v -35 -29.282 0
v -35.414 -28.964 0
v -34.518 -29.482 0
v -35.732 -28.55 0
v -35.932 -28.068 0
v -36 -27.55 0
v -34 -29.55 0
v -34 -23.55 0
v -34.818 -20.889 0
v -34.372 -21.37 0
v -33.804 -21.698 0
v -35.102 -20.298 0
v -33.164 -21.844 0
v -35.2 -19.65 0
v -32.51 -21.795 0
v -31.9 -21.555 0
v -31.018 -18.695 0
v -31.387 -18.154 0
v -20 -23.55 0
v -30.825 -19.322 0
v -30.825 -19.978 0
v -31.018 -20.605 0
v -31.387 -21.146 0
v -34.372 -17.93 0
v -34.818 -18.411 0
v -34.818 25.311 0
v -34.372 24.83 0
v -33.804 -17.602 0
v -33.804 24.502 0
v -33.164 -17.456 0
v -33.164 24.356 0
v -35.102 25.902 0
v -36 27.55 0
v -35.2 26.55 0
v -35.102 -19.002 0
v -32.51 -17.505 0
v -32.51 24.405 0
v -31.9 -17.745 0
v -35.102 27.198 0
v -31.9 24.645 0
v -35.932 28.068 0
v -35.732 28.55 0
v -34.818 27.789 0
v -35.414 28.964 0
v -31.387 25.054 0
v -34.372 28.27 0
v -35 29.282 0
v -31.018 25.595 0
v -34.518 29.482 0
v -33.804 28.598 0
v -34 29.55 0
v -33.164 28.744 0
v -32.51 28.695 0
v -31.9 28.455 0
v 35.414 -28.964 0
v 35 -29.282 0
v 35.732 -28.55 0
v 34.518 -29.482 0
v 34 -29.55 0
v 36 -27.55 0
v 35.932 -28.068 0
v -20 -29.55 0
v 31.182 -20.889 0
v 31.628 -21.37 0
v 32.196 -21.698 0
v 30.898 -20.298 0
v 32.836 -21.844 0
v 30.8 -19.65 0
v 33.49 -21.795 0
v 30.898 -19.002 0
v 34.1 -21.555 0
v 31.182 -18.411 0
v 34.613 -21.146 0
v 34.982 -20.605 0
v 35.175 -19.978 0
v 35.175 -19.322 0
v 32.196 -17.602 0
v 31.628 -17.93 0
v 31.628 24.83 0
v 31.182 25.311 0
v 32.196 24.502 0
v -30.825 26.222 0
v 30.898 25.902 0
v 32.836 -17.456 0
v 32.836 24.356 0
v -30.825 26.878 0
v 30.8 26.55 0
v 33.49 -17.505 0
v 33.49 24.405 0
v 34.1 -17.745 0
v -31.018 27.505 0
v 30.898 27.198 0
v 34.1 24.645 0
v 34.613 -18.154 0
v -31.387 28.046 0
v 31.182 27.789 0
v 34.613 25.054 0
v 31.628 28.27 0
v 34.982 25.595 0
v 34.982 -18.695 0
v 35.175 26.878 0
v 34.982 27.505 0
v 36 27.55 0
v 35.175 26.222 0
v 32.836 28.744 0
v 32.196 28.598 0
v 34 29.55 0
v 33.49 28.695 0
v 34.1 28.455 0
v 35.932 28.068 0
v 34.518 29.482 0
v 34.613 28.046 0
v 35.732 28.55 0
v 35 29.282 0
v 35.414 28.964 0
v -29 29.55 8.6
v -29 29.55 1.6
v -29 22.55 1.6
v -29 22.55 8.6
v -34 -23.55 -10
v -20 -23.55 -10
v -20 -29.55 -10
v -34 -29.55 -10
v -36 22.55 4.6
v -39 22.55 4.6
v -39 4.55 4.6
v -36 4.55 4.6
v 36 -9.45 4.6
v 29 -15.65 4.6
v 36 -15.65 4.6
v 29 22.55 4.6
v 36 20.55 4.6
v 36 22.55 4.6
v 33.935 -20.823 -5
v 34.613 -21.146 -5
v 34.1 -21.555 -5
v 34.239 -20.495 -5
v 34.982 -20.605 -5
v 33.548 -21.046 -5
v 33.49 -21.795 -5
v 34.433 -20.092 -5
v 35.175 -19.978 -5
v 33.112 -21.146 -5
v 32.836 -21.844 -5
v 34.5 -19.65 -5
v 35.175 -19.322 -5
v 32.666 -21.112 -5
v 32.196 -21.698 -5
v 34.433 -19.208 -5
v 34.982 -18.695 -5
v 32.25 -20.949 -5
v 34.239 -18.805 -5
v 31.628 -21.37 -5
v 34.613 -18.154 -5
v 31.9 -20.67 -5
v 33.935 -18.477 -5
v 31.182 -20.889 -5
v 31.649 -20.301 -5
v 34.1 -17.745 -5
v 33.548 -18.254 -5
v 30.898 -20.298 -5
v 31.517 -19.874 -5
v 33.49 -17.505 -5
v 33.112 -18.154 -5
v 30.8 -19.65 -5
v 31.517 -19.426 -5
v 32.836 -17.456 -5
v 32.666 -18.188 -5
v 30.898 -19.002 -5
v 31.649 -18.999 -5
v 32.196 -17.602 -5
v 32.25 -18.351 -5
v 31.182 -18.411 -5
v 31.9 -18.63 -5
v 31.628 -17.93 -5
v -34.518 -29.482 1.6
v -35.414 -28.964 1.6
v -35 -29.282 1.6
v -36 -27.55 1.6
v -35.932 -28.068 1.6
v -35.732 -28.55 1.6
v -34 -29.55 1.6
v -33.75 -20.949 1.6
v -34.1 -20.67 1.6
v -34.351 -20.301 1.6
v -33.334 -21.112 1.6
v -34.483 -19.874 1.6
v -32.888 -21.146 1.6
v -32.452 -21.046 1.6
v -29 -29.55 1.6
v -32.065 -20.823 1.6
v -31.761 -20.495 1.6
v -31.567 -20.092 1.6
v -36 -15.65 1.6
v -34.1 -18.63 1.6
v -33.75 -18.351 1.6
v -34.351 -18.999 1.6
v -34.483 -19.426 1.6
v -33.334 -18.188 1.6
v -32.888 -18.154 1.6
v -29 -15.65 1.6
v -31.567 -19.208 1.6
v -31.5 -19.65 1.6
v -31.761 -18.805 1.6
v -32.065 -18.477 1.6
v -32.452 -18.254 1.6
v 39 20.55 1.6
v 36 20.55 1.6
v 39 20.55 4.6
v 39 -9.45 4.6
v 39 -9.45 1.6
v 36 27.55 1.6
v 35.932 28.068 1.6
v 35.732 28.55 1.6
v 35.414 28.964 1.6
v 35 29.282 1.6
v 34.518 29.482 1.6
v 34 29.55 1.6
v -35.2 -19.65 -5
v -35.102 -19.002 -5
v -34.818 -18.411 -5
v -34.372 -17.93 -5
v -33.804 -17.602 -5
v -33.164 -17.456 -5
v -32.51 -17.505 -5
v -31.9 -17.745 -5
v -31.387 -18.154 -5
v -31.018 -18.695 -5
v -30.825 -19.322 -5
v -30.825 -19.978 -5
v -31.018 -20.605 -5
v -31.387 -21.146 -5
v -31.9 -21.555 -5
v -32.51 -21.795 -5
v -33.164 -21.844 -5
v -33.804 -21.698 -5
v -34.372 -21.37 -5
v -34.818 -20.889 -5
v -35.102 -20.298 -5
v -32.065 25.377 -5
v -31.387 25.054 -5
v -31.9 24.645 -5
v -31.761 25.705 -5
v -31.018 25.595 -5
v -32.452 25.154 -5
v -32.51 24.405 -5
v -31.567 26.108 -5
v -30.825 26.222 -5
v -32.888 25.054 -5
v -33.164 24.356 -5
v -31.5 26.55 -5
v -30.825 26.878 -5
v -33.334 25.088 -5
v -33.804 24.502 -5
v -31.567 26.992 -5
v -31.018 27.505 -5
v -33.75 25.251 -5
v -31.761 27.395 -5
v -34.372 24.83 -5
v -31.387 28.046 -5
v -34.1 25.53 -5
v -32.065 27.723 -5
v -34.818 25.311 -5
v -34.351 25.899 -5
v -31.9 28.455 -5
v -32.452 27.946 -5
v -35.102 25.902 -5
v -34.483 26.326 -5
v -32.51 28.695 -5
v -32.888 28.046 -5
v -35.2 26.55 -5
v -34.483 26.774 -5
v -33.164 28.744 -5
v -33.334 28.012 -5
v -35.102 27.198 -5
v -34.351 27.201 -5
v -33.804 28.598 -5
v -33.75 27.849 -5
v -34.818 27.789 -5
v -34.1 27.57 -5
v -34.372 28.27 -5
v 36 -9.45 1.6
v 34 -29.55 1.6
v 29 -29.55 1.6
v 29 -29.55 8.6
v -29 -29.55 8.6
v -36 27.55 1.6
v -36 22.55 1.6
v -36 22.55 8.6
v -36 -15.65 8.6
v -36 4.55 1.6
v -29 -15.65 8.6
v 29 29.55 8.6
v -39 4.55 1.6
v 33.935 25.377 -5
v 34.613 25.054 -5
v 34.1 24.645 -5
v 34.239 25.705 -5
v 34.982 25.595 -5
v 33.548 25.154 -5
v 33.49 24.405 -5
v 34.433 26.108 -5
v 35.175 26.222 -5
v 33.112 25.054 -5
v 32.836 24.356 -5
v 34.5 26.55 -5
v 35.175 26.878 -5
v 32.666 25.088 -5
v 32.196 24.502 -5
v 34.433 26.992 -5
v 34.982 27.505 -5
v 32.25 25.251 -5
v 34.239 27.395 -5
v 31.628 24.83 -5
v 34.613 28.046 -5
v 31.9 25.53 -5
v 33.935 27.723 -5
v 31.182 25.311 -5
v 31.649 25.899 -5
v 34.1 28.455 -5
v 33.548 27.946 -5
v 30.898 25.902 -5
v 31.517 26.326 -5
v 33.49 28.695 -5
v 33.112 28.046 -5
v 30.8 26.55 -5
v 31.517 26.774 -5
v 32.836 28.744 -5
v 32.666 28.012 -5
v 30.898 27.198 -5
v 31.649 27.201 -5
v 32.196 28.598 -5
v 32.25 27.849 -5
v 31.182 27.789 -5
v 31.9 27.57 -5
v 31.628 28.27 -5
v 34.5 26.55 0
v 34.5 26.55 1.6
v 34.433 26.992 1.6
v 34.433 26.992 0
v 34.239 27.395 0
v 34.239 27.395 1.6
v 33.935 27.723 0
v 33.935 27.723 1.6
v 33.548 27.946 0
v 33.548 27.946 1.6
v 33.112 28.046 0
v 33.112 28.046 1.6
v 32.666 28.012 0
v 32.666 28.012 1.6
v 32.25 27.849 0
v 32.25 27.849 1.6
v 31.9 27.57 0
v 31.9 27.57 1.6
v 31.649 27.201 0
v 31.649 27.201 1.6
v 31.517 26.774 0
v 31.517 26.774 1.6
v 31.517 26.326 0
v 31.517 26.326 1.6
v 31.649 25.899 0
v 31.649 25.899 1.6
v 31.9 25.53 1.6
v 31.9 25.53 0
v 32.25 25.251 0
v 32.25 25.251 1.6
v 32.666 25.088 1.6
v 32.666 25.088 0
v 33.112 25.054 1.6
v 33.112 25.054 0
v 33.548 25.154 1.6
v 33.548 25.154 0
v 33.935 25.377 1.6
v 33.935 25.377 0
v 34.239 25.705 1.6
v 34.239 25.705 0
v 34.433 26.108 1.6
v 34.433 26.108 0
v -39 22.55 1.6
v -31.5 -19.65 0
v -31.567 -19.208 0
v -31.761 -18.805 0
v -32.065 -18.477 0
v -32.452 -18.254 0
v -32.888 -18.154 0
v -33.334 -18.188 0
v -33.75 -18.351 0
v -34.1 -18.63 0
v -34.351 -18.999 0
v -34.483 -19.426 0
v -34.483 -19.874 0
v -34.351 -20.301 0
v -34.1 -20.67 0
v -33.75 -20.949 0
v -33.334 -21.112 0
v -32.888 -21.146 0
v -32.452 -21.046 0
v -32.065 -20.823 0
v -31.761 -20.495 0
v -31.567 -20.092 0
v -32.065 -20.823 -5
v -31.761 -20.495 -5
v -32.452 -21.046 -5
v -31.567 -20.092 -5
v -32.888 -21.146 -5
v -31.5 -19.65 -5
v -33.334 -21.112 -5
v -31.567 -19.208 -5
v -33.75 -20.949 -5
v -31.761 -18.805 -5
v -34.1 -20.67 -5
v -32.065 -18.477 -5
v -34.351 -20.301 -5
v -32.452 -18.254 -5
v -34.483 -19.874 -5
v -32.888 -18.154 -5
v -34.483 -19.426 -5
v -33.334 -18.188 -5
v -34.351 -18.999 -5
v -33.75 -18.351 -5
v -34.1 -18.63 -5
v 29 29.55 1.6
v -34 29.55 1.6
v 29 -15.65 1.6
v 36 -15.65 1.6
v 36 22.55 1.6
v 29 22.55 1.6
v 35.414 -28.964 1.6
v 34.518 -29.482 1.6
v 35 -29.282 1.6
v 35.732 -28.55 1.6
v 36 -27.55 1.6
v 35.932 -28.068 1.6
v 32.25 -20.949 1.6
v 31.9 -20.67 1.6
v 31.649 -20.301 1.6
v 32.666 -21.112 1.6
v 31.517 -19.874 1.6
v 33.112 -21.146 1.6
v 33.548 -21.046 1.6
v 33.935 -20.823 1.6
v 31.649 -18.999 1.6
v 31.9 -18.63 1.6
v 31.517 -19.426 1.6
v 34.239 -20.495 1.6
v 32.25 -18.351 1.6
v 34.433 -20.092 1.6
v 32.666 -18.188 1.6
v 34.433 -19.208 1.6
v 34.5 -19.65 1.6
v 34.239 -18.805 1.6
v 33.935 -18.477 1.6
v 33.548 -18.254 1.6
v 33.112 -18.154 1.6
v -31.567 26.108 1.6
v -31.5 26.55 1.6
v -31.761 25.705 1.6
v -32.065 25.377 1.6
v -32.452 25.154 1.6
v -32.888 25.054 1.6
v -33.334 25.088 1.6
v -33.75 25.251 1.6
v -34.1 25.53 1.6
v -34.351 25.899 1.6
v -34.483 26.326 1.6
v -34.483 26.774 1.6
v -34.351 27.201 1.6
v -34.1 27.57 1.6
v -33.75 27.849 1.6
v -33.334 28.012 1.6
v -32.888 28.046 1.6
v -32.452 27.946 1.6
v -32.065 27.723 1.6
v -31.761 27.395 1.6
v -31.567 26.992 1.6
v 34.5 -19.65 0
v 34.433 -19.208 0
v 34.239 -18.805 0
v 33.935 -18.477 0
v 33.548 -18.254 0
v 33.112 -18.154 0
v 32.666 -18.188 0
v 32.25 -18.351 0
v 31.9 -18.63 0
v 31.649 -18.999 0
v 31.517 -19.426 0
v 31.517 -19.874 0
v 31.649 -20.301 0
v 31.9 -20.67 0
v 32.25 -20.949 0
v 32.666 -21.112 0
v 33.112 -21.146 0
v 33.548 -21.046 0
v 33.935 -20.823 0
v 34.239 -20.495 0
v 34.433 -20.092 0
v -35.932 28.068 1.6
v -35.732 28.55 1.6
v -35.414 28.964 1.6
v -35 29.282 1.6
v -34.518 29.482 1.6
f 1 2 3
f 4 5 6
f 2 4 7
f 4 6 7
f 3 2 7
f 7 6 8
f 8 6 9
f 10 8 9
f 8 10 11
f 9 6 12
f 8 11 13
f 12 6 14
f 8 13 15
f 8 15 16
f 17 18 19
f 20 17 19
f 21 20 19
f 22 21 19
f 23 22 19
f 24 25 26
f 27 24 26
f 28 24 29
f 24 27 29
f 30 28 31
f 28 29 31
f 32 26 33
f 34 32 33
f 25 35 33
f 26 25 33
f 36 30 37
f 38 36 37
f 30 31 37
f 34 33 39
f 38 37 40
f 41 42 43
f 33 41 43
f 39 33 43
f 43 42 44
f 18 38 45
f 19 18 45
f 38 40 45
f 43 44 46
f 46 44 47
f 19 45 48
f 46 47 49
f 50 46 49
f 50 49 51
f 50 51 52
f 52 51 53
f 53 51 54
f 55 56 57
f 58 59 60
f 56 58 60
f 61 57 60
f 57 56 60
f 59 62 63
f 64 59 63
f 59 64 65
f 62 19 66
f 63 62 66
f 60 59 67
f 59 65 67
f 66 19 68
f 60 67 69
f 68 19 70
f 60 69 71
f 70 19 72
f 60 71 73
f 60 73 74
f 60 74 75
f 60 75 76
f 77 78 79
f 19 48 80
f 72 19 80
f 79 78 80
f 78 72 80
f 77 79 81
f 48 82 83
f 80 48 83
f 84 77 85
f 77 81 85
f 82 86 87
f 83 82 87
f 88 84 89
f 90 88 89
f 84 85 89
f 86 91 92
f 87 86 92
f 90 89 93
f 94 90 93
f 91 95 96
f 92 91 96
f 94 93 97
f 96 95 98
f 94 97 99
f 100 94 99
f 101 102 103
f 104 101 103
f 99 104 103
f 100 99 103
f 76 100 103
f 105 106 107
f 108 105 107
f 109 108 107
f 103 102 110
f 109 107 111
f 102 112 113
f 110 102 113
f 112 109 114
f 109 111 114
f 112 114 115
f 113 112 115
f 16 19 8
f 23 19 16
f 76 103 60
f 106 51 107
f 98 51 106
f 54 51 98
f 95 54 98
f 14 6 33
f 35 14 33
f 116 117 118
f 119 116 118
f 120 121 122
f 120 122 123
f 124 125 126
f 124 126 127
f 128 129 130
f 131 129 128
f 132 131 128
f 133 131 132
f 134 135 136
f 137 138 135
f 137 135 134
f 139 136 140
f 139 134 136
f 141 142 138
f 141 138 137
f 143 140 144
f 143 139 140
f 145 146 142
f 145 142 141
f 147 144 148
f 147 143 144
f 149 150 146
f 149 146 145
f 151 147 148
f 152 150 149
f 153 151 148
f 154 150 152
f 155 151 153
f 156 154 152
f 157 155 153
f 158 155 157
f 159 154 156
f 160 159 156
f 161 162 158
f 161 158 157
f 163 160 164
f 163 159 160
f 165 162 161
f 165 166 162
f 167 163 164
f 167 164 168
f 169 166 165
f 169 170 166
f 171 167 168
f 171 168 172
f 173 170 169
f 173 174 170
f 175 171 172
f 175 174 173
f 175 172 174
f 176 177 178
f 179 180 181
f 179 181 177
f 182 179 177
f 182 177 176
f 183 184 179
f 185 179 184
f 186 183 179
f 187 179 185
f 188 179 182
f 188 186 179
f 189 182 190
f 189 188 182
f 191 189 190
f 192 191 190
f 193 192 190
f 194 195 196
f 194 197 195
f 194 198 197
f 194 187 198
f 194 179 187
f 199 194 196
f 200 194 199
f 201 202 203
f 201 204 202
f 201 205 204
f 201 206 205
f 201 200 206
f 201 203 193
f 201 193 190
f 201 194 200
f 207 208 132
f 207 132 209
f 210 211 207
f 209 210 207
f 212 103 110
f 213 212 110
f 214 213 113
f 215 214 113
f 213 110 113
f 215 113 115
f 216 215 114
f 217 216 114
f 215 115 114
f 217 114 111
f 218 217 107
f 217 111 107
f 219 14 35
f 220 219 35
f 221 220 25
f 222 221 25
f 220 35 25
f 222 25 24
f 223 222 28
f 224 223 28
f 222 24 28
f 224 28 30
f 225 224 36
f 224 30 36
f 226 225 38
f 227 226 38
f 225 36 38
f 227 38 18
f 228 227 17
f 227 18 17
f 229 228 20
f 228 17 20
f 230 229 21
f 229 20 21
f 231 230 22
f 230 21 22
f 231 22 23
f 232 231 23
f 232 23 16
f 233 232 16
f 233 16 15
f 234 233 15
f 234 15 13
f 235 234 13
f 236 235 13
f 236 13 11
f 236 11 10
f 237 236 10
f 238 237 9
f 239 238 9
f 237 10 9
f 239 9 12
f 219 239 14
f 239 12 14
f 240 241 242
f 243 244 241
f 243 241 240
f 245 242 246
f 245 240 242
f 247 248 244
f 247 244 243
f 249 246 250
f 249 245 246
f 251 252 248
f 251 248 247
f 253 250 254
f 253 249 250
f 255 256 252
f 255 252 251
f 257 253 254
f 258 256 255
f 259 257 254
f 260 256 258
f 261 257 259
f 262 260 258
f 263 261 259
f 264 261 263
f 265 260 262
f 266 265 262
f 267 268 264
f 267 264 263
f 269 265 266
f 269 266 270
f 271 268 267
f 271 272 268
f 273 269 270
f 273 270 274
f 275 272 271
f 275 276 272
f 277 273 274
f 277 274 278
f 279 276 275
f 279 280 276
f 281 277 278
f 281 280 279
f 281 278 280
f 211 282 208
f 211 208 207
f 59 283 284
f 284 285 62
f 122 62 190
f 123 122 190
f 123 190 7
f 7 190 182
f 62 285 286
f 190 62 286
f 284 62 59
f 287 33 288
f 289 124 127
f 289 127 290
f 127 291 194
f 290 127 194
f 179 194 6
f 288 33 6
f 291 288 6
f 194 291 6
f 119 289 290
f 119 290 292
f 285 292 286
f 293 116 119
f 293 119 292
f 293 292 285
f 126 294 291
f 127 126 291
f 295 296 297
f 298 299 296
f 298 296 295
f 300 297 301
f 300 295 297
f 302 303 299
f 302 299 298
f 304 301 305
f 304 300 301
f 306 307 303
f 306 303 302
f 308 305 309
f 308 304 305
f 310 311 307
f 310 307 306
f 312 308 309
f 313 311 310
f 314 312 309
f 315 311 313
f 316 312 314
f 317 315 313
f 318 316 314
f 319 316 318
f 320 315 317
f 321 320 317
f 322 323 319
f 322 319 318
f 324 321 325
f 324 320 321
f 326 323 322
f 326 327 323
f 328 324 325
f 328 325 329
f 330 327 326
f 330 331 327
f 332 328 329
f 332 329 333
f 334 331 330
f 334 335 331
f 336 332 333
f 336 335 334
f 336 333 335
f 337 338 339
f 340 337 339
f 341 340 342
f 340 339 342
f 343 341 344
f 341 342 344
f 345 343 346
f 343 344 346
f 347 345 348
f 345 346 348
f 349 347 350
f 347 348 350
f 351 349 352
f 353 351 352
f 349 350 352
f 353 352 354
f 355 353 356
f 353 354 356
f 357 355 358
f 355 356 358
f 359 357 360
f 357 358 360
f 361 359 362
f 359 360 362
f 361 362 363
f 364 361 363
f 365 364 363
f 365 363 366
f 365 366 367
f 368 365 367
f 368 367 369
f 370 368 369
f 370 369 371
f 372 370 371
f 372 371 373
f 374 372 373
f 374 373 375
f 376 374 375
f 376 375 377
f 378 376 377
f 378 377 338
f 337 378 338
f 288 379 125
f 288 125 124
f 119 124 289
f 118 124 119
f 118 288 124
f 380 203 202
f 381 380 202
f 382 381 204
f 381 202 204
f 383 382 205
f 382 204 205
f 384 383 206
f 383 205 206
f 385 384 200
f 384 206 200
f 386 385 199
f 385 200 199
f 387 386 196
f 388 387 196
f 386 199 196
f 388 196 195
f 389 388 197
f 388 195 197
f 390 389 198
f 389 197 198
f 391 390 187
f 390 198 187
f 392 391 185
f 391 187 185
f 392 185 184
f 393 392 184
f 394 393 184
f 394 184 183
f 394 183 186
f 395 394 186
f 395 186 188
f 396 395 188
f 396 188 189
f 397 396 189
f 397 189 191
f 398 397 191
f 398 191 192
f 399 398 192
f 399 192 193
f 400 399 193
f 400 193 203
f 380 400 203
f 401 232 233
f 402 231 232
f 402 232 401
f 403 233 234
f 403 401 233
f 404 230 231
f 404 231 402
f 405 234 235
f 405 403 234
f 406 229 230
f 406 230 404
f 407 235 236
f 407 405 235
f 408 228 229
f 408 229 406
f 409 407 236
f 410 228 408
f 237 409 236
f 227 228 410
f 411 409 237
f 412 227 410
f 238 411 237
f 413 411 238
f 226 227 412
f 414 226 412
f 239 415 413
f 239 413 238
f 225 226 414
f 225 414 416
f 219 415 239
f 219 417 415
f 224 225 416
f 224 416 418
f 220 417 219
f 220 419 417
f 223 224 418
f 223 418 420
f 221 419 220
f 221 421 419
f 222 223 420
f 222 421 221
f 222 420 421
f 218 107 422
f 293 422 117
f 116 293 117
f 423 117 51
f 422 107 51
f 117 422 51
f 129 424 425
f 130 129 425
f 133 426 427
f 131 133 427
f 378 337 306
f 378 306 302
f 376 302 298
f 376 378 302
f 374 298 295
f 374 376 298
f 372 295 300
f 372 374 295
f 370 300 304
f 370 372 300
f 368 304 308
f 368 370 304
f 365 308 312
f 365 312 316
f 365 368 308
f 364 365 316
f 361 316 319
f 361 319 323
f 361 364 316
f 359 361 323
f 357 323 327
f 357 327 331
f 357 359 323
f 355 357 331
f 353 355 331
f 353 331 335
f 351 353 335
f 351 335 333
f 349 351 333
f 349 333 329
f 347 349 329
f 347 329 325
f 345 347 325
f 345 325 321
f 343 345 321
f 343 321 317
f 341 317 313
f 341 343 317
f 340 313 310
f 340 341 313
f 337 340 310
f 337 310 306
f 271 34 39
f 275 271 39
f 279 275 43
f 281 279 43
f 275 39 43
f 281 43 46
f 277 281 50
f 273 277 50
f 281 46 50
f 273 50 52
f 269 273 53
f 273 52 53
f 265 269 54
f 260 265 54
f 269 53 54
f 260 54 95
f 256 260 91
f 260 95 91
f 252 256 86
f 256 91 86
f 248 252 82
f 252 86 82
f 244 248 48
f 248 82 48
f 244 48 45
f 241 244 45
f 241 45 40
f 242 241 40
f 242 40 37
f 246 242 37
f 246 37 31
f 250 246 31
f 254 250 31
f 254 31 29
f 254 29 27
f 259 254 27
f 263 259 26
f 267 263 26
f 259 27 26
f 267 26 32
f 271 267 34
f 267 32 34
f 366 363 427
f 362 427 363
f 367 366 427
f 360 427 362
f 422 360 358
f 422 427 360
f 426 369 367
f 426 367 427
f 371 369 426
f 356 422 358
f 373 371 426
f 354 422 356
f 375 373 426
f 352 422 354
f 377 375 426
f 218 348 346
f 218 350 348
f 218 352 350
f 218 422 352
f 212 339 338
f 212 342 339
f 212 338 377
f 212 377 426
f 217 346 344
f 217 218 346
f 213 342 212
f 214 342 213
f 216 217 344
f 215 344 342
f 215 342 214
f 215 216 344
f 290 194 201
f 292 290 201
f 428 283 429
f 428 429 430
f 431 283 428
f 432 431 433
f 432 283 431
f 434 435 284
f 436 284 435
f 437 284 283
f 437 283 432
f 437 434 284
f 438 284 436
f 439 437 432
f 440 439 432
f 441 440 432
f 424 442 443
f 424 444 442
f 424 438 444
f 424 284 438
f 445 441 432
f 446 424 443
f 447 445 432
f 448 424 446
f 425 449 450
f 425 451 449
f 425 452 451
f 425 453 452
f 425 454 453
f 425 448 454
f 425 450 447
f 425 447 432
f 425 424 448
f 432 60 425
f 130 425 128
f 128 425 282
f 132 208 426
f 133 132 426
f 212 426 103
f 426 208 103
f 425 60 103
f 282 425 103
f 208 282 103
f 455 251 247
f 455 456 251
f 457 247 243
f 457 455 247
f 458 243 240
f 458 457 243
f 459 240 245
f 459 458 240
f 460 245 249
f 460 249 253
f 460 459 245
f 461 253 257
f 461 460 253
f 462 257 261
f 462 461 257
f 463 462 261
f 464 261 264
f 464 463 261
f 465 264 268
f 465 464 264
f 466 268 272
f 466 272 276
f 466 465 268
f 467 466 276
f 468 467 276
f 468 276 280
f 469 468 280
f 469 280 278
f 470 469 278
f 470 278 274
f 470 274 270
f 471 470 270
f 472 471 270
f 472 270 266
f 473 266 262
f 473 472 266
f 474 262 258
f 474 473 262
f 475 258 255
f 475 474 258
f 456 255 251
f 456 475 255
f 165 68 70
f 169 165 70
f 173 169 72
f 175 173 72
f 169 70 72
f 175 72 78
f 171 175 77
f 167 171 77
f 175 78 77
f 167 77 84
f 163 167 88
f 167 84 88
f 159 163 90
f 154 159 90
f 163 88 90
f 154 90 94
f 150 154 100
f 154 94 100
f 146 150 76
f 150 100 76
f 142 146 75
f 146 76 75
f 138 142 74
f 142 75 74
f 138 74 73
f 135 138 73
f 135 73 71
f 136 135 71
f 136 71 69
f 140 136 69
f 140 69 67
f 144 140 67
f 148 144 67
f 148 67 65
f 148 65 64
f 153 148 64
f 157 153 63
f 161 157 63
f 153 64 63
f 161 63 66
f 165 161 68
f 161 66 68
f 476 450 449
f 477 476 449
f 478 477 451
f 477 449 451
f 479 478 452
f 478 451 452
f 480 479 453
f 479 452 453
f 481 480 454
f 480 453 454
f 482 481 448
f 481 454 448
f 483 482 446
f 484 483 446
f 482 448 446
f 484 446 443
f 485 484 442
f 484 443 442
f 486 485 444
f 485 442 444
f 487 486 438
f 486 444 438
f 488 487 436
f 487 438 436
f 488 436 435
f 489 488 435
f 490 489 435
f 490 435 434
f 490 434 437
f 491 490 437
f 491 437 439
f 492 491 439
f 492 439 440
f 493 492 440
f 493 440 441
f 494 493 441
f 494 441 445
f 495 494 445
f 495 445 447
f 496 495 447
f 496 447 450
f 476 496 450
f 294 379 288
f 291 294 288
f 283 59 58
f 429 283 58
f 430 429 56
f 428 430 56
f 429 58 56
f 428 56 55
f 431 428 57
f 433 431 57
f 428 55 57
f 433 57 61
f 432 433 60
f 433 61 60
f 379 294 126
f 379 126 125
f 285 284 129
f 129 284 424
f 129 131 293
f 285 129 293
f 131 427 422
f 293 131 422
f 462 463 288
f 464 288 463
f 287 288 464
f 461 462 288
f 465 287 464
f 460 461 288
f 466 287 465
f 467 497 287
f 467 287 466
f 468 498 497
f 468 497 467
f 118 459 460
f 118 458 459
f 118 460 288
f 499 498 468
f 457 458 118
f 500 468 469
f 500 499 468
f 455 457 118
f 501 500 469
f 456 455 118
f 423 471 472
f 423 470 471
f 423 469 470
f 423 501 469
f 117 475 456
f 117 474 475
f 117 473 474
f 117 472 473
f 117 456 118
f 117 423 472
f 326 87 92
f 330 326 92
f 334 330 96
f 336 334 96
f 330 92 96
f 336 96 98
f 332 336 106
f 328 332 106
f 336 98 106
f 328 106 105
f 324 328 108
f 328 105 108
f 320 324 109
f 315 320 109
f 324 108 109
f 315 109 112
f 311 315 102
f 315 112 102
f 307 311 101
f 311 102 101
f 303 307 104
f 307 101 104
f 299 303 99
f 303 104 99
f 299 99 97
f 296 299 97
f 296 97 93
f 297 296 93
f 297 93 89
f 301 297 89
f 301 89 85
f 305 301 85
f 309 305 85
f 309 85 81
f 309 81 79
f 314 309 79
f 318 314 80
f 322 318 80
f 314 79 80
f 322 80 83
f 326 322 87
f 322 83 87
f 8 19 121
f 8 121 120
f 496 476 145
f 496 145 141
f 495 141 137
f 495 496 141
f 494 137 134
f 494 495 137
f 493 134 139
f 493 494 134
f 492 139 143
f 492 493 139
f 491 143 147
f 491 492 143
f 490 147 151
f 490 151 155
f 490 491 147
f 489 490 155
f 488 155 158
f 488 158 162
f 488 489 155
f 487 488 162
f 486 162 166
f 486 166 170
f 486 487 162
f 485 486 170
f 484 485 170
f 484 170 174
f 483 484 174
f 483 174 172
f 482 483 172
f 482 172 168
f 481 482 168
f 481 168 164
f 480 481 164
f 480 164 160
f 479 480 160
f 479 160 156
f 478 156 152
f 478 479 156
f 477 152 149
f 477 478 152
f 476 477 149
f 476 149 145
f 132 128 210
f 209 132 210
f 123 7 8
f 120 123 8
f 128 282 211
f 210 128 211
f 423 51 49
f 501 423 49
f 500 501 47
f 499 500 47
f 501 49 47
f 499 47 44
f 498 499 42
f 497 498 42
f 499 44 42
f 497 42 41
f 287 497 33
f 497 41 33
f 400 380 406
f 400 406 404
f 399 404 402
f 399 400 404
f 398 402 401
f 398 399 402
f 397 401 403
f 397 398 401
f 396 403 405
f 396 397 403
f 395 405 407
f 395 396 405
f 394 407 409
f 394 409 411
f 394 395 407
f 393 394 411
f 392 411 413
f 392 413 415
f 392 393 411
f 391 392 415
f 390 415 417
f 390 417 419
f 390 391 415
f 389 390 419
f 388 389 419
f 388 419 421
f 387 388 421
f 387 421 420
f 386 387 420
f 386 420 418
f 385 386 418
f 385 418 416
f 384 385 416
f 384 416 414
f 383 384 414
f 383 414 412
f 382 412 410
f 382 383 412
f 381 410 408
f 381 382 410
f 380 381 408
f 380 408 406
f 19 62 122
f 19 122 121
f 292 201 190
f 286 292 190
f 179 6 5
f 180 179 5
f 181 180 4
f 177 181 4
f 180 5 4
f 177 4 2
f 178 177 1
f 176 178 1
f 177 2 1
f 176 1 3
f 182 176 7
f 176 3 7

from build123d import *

# Parameters (mm, degrees)
EXTRUDE_1_DEPTH     = 1.6
SKETCH_2_R          = 1.5
CUT_EXTRUDE_1_DEPTH = 47.602172696
SKETCH_3_R          = 2.2
SKETCH_3_R_2        = 1.5
EXTRUDE_2_DEPTH     = 5
EXTRUDE_3_DEPTH     = 7
SKETCH_5_W          = 14
SKETCH_5_H          = 6
EXTRUDE_4_DEPTH     = 10
SKETCH_6_W          = 3
SKETCH_6_H          = 18
SKETCH_6_H_2        = 30
EXTRUDE_5_DEPTH     = 3
SKETCH_7_W          = 7
SKETCH_7_H          = 38.2
CUT_EXTRUDE_2_DEPTH = 4


with BuildPart() as part:
    # 草图1 → 凸台-拉伸1 (new body)
    with BuildSketch(Plane.XY):
        with BuildLine():
            Line((-34, -29.55), (34, -29.55))
            ThreePointArc((34, -29.55), (35.414213562, -28.964213562), (36, -27.55))
            Line((36, -27.55), (36, 27.55))
            ThreePointArc((36, 27.55), (35.414213562, 28.964213562), (34, 29.55))
            Line((34, 29.55), (-34, 29.55))
            ThreePointArc((-34, 29.55), (-35.414213562, 28.964213562), (-36, 27.55))
            Line((-36, 27.55), (-36, -27.55))
            ThreePointArc((-36, -27.55), (-35.414213562, -28.964213562), (-34, -29.55))
        make_face()
    extrude(amount=EXTRUDE_1_DEPTH)

    # 草图2 → 切除-拉伸1 (cut, through all)
    with BuildSketch(Plane.XY.offset(1.6)):
        with Locations((-33, 26.55)):
            Circle(SKETCH_2_R)
        with Locations((33, 26.55)):
            Circle(SKETCH_2_R)
        with Locations((-33, -19.65)):
            Circle(SKETCH_2_R)
        with Locations((33, -19.65)):
            Circle(SKETCH_2_R)
    extrude(amount=-CUT_EXTRUDE_1_DEPTH, mode=Mode.SUBTRACT)

    # 草图3 → 凸台-拉伸2 (add)
    # profile 1 of 4: a face of its own
    with BuildSketch(Plane(origin=(0, 0, 0), x_dir=(-1, 0, 0), z_dir=(0, 0, -1))):
        with Locations((33, 26.55)):
            Circle(SKETCH_3_R)
        with Locations(Location((33, 26.55, 0), (0, 0, 180))):
            Circle(SKETCH_3_R_2, mode=Mode.SUBTRACT)
    # profile 2 of 4: a face of its own
    with BuildSketch(Plane(origin=(0, 0, 0), x_dir=(-1, 0, 0), z_dir=(0, 0, -1))):
        with Locations((33, -19.65)):
            Circle(SKETCH_3_R)
        with Locations(Location((33, -19.65, 0), (0, 0, 180))):
            Circle(SKETCH_3_R_2, mode=Mode.SUBTRACT)
    # profile 3 of 4: a face of its own
    with BuildSketch(Plane(origin=(0, 0, 0), x_dir=(-1, 0, 0), z_dir=(0, 0, -1))):
        with Locations((-33, -19.65)):
            Circle(SKETCH_3_R)
        with Locations(Location((-33, -19.65, 0), (0, 0, 180))):
            Circle(SKETCH_3_R_2, mode=Mode.SUBTRACT)
    # profile 4 of 4: a face of its own
    with BuildSketch(Plane(origin=(0, 0, 0), x_dir=(-1, 0, 0), z_dir=(0, 0, -1))):
        with Locations((-33, 26.55)):
            Circle(SKETCH_3_R)
        with Locations(Location((-33, 26.55, 0), (0, 0, 180))):
            Circle(SKETCH_3_R_2, mode=Mode.SUBTRACT)
    extrude(amount=EXTRUDE_2_DEPTH)

    # 草图4 → 凸台-拉伸3 (add)
    with BuildSketch(Plane.XY.offset(1.6)):
        Polygon((-29, 29.55), (-29, 22.55), (-36, 22.55), (-36, -15.65), (-29, -15.65), (-29, -29.55), (29, -29.55), (29, -15.65), (36, -15.65), (36, 22.55), (29, 22.55), (29, 29.55), align=None)
    extrude(amount=EXTRUDE_3_DEPTH)

    # 草图5 → 凸台-拉伸4 (add)
    with BuildSketch(Plane(origin=(0, 0, 0), x_dir=(-1, 0, 0), z_dir=(0, 0, -1))):
        with Locations((27, -26.55)):
            Rectangle(SKETCH_5_W, SKETCH_5_H)
    extrude(amount=EXTRUDE_4_DEPTH)

    # 草图6 → 凸台-拉伸5 (add)
    with BuildSketch(Plane.XY.offset(1.6)):
        with Locations((-37.5, 13.55)):
            Rectangle(SKETCH_6_W, SKETCH_6_H)
        with Locations((37.5, 5.55)):
            Rectangle(SKETCH_6_W, SKETCH_6_H_2)
    extrude(amount=EXTRUDE_5_DEPTH)

    # 草图7 → 切除-拉伸2 (cut)
    with BuildSketch(Plane.XY.offset(8.6)):
        with Locations((32.5, 3.45)):
            Rectangle(SKETCH_7_W, SKETCH_7_H)
    extrude(amount=-CUT_EXTRUDE_2_DEPTH, mode=Mode.SUBTRACT)


solid = part.part
